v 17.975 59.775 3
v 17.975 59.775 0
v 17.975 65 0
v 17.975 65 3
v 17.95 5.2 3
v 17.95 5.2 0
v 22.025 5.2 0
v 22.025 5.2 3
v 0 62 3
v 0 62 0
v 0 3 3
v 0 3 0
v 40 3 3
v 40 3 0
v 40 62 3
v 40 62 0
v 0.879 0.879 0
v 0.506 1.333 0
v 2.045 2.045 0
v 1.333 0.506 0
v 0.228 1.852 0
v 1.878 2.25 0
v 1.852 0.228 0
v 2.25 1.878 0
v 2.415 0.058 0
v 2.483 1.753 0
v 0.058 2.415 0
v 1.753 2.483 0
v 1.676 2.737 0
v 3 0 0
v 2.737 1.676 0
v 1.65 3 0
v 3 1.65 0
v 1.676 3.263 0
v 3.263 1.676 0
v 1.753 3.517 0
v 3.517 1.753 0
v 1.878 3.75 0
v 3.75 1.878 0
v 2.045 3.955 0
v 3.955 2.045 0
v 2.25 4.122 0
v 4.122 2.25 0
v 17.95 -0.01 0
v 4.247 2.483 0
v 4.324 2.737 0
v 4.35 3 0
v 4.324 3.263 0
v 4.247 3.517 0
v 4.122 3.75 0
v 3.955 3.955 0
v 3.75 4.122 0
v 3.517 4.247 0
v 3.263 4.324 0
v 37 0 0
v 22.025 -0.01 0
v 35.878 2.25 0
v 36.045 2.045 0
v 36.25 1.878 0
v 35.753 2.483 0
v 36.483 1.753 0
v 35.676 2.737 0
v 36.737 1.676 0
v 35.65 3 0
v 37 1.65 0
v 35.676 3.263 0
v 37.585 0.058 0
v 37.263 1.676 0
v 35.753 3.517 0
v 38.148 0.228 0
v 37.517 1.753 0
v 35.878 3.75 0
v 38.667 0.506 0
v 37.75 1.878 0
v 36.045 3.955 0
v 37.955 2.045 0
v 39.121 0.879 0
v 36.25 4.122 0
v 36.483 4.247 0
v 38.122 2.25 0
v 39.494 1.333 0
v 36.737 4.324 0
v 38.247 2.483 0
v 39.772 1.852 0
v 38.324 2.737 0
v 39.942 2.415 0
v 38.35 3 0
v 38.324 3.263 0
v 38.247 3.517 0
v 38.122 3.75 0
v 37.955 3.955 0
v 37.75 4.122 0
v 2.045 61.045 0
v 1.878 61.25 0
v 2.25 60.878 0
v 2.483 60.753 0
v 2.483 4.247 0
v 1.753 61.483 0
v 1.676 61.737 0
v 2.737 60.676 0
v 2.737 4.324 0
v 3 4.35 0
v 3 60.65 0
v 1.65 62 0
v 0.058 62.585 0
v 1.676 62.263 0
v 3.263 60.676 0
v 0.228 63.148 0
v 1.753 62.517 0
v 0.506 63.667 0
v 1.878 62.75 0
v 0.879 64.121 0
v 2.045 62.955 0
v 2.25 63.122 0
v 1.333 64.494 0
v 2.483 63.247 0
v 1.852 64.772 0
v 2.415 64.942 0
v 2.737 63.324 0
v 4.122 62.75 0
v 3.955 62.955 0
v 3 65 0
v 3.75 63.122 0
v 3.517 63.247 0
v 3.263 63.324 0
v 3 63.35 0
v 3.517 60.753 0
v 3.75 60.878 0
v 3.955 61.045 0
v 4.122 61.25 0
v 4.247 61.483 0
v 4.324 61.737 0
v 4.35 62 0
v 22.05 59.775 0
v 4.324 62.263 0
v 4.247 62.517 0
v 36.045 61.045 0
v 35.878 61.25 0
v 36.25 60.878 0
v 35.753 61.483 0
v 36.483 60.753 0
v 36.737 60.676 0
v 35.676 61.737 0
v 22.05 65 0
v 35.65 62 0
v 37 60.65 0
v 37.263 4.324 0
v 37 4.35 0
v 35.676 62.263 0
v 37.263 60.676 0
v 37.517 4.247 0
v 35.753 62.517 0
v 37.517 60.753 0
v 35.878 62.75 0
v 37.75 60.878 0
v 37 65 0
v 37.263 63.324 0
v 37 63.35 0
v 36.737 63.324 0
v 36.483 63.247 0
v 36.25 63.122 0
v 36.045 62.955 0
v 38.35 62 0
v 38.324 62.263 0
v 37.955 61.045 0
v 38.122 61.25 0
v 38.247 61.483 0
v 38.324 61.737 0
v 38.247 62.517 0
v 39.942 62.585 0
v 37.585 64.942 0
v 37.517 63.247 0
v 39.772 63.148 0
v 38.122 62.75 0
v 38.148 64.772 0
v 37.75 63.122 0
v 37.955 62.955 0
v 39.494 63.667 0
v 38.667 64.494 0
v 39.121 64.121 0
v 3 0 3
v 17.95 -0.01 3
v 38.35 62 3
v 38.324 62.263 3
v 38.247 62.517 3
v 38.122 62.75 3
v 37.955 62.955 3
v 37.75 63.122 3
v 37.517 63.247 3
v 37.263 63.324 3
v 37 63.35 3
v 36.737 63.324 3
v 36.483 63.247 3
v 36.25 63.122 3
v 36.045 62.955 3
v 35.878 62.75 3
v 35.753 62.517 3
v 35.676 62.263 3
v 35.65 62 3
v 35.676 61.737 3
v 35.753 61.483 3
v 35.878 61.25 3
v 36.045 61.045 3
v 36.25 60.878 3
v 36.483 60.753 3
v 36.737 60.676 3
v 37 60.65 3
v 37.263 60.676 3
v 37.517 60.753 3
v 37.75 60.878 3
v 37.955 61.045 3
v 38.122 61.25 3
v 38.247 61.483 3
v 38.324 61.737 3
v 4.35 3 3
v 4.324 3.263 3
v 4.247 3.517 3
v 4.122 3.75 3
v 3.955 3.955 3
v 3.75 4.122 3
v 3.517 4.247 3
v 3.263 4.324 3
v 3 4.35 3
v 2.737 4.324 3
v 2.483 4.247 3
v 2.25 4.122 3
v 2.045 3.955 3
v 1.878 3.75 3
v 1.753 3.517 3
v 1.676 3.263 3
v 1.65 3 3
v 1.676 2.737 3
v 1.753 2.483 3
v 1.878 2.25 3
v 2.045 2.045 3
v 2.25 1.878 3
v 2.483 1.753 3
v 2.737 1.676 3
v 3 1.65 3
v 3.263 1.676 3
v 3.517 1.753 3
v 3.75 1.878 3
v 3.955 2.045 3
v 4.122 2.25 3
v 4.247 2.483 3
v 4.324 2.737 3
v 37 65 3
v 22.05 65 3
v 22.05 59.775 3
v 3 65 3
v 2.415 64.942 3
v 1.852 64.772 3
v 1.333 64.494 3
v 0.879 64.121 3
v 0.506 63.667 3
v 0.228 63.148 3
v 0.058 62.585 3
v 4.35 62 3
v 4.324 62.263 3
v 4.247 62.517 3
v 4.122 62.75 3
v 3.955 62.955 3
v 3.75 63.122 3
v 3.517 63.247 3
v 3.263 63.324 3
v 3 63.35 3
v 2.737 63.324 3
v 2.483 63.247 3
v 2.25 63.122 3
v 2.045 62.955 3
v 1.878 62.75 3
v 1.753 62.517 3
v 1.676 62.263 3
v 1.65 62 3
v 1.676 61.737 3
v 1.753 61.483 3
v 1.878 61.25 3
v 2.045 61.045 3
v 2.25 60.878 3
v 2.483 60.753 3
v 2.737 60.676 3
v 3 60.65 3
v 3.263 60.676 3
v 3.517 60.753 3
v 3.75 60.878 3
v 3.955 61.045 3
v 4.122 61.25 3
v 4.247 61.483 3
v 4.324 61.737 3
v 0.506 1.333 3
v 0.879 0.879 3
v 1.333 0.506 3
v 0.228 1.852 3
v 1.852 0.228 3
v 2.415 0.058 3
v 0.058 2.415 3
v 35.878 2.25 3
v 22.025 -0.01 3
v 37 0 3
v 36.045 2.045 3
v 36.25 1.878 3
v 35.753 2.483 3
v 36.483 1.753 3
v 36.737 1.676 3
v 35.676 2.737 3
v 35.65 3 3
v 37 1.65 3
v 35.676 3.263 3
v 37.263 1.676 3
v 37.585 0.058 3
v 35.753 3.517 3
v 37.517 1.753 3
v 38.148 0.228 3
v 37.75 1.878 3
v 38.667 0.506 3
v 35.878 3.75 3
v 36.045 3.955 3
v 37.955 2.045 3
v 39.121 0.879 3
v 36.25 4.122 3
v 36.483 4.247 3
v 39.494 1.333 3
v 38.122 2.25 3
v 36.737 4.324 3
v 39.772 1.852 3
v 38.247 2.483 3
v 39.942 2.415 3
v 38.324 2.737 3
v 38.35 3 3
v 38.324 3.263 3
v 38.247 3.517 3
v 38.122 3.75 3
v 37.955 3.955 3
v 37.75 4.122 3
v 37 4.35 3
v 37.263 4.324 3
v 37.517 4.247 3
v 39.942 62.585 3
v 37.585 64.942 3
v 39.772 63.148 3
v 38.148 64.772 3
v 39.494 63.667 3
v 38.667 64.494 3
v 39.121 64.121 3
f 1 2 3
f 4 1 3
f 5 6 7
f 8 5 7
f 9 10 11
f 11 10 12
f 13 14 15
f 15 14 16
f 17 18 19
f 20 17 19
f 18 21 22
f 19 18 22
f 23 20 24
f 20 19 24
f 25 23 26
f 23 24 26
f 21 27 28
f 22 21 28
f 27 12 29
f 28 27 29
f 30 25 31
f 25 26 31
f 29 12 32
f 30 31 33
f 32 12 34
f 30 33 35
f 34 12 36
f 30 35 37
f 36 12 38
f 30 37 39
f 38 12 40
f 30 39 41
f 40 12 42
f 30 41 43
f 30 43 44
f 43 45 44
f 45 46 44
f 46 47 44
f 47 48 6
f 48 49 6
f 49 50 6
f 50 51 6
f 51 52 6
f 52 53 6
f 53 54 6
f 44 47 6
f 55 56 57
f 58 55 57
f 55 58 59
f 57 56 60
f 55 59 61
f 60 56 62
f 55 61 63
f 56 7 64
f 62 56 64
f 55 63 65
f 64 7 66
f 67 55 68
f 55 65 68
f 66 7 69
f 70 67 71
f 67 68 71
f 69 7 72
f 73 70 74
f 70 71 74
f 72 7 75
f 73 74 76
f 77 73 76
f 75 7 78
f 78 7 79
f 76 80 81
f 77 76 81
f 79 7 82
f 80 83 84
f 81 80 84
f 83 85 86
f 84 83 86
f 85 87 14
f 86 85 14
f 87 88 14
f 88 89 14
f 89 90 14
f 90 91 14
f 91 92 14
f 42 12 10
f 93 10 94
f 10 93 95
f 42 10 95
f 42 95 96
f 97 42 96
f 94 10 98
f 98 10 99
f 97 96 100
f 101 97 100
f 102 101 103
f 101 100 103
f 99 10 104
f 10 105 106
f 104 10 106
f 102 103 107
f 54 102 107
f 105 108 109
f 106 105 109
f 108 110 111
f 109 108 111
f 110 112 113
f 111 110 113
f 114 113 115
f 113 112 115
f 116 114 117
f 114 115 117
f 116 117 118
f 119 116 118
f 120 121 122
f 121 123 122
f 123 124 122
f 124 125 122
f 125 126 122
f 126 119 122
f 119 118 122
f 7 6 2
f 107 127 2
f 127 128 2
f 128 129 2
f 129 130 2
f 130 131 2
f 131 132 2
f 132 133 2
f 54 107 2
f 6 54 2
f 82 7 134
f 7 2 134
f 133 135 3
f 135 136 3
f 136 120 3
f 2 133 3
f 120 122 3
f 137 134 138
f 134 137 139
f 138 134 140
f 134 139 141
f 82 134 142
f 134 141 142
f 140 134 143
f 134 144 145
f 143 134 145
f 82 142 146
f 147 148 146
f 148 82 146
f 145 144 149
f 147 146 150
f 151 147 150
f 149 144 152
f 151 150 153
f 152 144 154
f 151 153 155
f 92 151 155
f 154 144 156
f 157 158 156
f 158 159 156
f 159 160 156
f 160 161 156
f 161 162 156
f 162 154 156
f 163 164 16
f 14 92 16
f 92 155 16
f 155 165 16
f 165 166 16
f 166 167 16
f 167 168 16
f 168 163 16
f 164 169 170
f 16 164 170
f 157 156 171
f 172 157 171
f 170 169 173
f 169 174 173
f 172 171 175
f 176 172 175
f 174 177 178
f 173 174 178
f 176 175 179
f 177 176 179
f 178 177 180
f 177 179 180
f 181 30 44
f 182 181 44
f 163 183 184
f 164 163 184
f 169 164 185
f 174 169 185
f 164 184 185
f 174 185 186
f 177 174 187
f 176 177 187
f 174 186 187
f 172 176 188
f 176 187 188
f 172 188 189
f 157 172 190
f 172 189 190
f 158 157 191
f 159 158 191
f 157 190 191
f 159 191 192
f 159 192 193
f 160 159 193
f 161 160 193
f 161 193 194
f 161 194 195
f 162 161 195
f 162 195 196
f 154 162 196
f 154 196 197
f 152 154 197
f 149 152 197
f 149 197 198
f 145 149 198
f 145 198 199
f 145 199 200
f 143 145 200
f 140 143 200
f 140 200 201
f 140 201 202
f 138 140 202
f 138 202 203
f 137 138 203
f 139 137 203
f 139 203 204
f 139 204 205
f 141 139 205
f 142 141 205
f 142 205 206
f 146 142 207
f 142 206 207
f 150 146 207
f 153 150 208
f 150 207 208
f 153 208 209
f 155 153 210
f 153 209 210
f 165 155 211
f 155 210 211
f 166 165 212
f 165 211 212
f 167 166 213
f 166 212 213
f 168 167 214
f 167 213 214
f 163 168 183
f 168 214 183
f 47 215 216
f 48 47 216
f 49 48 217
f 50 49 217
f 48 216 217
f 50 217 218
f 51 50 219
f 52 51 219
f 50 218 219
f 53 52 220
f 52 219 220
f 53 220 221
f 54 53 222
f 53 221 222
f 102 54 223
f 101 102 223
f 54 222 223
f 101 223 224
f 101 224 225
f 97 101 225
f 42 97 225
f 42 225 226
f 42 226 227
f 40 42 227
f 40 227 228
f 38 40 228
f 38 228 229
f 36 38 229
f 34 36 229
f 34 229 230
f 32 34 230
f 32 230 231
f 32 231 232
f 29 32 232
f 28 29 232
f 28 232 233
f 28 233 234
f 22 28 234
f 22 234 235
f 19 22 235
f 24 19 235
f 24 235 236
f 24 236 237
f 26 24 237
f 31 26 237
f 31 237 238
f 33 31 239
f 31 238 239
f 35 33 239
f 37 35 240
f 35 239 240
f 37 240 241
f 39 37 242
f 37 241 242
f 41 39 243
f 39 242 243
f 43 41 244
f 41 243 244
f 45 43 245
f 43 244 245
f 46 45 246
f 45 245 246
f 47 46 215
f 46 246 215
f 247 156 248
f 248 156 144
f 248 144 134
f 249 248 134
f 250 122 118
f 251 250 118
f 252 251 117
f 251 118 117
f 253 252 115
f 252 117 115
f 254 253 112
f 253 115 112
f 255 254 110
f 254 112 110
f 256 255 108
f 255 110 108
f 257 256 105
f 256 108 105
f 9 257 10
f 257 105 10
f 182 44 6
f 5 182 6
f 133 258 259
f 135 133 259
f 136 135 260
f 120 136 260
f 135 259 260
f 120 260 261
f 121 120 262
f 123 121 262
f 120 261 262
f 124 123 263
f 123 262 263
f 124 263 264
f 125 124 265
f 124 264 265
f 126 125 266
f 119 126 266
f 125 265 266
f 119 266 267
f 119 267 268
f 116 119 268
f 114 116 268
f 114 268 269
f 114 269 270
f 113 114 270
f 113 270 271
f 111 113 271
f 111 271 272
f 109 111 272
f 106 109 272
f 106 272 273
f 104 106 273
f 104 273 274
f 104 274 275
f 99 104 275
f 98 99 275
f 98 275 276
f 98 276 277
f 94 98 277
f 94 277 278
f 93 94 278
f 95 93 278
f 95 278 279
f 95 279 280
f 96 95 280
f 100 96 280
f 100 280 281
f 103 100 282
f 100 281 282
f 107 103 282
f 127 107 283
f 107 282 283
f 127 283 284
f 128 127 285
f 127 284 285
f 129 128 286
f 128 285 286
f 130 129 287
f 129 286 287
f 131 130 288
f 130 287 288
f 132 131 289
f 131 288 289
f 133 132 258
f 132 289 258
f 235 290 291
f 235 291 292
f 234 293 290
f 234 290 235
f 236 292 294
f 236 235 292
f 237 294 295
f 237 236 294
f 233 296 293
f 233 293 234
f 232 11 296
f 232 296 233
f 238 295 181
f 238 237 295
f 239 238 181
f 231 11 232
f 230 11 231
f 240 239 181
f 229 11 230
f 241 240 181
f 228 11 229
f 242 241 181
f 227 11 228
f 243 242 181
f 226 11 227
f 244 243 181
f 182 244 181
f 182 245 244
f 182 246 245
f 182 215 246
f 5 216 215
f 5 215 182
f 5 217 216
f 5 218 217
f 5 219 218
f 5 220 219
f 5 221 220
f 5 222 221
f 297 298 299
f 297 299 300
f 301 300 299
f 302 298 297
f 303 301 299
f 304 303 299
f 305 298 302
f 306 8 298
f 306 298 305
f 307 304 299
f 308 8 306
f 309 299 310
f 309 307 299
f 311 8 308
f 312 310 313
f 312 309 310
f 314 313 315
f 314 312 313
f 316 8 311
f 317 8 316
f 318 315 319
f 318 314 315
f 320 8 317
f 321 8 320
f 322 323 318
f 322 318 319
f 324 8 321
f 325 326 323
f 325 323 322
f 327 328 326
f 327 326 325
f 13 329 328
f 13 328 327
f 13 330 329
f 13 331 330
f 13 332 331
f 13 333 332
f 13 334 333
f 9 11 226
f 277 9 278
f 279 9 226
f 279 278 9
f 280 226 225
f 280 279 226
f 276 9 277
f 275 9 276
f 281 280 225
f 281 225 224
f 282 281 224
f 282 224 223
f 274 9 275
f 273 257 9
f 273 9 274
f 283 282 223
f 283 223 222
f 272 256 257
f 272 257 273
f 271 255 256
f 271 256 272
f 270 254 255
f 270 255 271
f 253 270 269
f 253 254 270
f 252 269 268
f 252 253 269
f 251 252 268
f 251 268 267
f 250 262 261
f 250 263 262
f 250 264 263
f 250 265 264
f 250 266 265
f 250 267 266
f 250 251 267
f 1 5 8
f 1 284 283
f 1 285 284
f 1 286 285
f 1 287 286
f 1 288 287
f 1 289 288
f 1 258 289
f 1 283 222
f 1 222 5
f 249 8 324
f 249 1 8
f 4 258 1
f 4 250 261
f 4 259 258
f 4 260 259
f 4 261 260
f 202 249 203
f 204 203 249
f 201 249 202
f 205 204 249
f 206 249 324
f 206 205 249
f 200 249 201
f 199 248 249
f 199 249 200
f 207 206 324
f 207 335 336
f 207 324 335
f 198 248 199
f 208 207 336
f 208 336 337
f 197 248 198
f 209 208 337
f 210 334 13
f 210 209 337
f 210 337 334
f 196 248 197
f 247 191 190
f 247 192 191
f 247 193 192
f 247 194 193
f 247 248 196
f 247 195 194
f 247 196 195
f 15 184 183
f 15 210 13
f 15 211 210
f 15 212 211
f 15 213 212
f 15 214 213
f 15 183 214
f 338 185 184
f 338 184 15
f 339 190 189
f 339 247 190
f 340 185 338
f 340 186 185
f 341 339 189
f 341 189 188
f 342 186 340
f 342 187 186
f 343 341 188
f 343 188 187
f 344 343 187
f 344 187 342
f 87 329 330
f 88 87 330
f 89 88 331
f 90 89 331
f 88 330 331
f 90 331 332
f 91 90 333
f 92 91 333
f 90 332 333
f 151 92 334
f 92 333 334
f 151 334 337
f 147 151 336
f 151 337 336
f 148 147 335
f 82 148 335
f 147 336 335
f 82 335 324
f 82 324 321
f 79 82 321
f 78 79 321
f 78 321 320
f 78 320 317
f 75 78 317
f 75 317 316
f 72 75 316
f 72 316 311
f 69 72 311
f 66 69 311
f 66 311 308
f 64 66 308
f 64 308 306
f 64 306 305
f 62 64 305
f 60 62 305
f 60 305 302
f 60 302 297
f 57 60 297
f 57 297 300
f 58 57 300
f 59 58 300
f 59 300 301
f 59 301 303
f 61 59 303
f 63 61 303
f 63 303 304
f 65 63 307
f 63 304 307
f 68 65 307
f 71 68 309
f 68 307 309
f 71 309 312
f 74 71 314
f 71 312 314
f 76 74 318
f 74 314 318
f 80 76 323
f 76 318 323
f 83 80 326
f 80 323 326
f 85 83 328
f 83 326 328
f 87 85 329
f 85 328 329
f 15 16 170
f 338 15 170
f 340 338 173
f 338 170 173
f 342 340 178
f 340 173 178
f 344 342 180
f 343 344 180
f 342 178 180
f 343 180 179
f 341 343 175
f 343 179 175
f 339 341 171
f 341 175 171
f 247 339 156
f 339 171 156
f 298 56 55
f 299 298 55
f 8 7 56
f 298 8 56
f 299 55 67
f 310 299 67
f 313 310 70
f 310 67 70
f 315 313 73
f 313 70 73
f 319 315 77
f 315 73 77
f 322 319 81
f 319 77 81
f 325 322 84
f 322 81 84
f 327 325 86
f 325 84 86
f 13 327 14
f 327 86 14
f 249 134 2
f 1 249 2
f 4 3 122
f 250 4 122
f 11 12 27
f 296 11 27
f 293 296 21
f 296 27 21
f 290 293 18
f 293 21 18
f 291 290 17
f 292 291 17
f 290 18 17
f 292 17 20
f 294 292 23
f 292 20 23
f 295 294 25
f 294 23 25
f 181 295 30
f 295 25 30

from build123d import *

# Parameters (mm, degrees)
BOSS_EXTRUDE1_DEPTH = 3
SKETCH2_R           = 1.35
CUT_EXTRUDE1_DEPTH  = 77.380625816


with BuildPart() as part:
    # Sketch1 → Boss-Extrude1 (new body)
    with BuildSketch(Plane.XY):
        with BuildLine():
            Line((3, 0), (17.95, -0.01))
            Line((17.95, -0.01), (17.95, 5.2))
            Line((17.95, 5.2), (22.025, 5.2))
            Line((22.025, 5.2), (22.025, -0.01))
            Line((22.025, -0.01), (37, 0))
            ThreePointArc((37, 0), (39.121320344, 0.878679656), (40, 3))
            Line((40, 3), (40, 62))
            ThreePointArc((40, 62), (39.121320344, 64.121320344), (37, 65))
            Line((37, 65), (22.05, 65))
            Line((22.05, 65), (22.05, 59.775))
            Line((22.05, 59.775), (17.975, 59.775))
            Line((17.975, 59.775), (17.975, 65))
            Line((17.975, 65), (3, 65))
            ThreePointArc((3, 65), (0.878679656, 64.121320344), (0, 62))
            Line((0, 62), (0, 3))
            ThreePointArc((0, 3), (0.878679656, 0.878679656), (3, 0))
        make_face()
    extrude(amount=BOSS_EXTRUDE1_DEPTH)

    # Sketch2 → Cut-Extrude1 (cut, through all)
    with BuildSketch(Plane.XY.offset(3)):
        with Locations((3, 3)):
            Circle(SKETCH2_R)
        with Locations((37, 3)):
            Circle(SKETCH2_R)
        with Locations((37, 62)):
            Circle(SKETCH2_R)
        with Locations((3, 62)):
            Circle(SKETCH2_R)
    extrude(amount=-CUT_EXTRUDE1_DEPTH, mode=Mode.SUBTRACT)


solid = part.part
